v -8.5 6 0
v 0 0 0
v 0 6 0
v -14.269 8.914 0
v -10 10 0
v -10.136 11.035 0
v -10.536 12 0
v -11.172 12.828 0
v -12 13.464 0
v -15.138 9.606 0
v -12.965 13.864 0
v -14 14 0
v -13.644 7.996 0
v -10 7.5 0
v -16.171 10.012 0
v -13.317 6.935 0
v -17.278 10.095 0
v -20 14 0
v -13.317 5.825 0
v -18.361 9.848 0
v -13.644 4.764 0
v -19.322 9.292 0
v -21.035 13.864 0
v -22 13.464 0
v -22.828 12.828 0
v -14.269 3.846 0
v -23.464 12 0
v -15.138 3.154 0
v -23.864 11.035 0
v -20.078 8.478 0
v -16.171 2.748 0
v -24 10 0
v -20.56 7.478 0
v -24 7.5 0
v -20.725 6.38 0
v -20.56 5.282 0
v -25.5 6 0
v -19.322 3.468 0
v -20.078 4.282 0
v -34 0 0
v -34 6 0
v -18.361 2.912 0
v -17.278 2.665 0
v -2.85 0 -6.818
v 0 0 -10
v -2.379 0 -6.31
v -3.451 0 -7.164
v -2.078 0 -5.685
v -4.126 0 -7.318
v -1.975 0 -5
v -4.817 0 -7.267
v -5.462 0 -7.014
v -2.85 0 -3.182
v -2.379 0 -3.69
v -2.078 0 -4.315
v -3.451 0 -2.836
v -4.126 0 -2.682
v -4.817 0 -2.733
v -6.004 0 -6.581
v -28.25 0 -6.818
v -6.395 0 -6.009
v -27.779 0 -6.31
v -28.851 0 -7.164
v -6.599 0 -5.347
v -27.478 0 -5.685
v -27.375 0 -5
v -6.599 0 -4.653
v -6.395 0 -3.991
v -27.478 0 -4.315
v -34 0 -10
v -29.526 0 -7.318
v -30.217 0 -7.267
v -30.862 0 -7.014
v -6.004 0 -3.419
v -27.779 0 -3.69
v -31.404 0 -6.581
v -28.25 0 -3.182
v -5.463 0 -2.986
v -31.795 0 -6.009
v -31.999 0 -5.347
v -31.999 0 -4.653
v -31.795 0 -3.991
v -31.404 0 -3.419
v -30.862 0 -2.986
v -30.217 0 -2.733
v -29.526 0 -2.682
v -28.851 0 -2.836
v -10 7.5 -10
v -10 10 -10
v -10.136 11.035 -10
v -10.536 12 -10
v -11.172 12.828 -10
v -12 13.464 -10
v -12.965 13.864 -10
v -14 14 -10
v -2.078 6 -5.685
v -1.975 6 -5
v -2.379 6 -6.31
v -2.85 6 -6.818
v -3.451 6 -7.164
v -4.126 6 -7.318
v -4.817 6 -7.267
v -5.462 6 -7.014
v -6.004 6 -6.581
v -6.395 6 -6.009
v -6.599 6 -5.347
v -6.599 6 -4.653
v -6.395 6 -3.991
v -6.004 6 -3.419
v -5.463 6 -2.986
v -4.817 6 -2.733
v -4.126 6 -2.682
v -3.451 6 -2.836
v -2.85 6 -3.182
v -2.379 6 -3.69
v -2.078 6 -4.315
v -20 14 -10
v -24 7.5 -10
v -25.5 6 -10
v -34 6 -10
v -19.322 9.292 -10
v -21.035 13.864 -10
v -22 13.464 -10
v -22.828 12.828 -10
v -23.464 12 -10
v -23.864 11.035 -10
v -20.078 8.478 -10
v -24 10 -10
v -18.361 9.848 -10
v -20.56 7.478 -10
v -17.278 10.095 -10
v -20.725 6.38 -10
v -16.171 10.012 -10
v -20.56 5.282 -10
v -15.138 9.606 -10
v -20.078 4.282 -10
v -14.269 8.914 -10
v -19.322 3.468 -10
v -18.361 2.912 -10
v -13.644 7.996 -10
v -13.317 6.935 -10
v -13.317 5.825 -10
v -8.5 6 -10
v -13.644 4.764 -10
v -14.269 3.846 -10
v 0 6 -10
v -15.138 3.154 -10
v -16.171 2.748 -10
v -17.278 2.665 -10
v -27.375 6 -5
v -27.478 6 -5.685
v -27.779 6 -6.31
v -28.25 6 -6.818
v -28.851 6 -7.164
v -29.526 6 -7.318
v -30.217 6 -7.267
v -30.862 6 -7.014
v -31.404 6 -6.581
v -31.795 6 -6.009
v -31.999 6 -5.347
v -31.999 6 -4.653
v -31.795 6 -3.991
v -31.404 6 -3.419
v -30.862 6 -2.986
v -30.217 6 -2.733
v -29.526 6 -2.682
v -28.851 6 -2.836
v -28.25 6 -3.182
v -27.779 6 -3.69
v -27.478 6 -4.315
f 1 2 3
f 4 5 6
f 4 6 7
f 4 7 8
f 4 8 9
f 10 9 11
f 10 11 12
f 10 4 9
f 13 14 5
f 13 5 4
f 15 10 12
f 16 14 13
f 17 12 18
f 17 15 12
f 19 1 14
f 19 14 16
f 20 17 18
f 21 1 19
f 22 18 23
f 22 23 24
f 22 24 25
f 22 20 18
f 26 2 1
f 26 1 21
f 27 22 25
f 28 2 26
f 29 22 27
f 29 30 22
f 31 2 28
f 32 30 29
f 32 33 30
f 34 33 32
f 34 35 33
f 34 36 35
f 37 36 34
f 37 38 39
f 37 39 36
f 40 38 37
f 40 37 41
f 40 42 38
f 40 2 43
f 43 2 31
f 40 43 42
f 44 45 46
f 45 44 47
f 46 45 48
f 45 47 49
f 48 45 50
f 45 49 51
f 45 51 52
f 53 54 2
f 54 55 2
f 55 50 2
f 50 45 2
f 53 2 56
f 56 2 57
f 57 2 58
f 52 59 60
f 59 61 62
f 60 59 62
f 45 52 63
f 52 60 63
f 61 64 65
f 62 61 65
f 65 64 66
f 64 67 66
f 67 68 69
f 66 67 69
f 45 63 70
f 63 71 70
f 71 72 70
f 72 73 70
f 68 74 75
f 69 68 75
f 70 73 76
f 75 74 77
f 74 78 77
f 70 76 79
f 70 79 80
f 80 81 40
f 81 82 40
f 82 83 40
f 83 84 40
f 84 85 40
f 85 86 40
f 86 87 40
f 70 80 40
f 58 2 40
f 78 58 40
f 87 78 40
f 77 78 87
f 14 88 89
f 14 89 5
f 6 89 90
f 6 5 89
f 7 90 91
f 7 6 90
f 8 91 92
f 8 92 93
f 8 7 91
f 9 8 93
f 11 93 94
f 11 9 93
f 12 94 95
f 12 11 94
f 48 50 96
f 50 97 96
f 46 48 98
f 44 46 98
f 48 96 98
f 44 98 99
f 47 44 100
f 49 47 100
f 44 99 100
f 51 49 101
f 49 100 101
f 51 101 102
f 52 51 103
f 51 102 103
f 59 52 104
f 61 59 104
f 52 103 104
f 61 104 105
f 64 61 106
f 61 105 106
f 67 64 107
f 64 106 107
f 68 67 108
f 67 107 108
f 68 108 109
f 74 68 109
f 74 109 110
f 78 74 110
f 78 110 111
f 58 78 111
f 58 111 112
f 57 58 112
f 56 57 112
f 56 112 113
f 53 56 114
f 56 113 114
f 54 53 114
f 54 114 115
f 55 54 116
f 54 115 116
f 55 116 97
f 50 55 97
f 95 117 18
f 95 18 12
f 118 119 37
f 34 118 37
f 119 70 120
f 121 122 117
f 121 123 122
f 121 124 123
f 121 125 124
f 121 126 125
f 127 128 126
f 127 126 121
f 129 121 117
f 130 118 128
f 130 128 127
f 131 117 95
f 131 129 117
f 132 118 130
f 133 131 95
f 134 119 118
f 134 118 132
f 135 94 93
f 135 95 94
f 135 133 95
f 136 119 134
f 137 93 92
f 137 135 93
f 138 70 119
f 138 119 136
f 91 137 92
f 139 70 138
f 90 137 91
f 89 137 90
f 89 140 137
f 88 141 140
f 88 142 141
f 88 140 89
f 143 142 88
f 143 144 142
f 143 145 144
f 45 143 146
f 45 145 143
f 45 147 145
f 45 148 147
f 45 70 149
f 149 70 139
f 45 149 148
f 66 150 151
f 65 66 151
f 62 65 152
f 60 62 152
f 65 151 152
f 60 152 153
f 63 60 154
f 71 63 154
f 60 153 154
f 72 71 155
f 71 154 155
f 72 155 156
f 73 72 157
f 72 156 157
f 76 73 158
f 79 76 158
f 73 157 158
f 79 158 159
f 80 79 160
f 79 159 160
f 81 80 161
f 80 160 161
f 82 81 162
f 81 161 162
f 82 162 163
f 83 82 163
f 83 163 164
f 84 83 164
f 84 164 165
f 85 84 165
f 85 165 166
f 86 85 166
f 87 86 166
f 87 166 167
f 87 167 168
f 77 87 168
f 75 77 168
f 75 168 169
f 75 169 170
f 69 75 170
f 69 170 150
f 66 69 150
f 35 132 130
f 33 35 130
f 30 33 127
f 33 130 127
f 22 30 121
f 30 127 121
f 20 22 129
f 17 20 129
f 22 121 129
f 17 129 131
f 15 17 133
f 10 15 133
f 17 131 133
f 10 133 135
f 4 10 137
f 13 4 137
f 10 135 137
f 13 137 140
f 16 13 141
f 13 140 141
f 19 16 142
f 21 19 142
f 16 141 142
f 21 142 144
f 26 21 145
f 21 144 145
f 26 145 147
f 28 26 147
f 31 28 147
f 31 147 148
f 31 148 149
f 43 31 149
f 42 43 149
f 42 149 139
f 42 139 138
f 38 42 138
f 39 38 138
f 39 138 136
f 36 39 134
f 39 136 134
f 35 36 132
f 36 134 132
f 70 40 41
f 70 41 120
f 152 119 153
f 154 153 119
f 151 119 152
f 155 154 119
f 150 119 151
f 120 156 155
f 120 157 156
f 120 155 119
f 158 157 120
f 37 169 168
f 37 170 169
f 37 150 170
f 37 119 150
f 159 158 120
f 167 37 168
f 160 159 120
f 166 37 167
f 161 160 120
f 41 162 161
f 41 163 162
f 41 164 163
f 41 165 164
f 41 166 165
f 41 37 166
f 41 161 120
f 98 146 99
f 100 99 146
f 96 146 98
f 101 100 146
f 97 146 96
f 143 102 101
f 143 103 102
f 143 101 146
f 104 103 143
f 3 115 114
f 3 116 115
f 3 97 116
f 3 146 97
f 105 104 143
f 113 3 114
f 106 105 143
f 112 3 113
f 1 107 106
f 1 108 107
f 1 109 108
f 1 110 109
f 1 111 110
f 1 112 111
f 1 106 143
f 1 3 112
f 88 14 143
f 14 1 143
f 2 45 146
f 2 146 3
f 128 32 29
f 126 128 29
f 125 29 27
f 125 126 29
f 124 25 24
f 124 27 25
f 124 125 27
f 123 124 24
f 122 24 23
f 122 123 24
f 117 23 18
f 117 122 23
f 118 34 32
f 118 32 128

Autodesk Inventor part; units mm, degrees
ref_plane "YZ Plane" through (0, 0, 0) normal (1, 0, 0) x (0, 1, 0)
ref_plane "XZ Plane" through (0, 0, 0) normal (0, 1, 0) x (-1, 0, 0)
ref_plane "XY Plane" through (0, 0, 0) normal (0, 0, 1) x (1, 0, 0)
sketch "Sketch1" plane through (0, 0, 0) normal (0, 1, 0) x (-1, 0, 0)
  line L0 (0, 0) -> (34, 0)
  line L1 (34, 0) -> (34, -10)
  line L2 (34, -10) -> (0, -10)
  line L3 (0, -10) -> (0, 0)
  dimension "d0" = 34
  dimension "d1" = 10
extrude "Extrusion1" add sketch "Sketch1" along normal blind 6
sketch "Sketch3" plane through (0, 6, 0) normal (0, 1, 0) x (1, 0, 0)
  circle A0 centre (-4.3, 5) radius 2.325
  line L0 (0, 10) -> (-34, 10) projected
  circle A1 centre (-29.7, 5) radius 2.325
  line L1 (-34, 10) -> (-34, 0) projected
  line L2 (0, 0) -> (0, 10) projected
  dimension "d4" = 4.65
  dimension "d5" = 5
  dimension "d6" = 4.65
  dimension "d7" = 5
  dimension "d9" = 4.3
  dimension "d10" = 4.3
extrude "Extrusion2" cut sketch "Sketch3" against normal through all
sketch "Sketch4" plane through (0, 6, 0) normal (0, 1, 0) x (1, 0, 0)
  line L0 (-34, 0) -> (0, 0) projected
  line L1 (0, 10) -> (-34, 10) projected
  line L2 (-10, 0) -> (-24, 0)
  line L3 (-24, 0) -> (-24, 10)
  line L4 (-24, 10) -> (-10, 10)
  line L5 (-10, 10) -> (-10, 0)
  circle A0 centre (-4.3, 5) radius 2.325 projected
  line L6 (-34, 10) -> (-34, 0) projected
  line L7 (0, 0) -> (0, 10) projected
  point P0 (-10, 10)
  point P1 (-24, 0)
  dimension "d34" = 14
  dimension "d35" = 10
extrude "Extrusion3" add sketch "Sketch4" along normal blind 8 contours L3 L1 L5 L0
sketch "Sketch6" plane through (0, 0, -10) normal (0, 0, -1) x (-1, 0, 0)
  circle A0 centre (17, 6.38) radius 3.725
  line L0 (10, 14) -> (24, 14) projected
  line L1 (24, 6) -> (24, 14) projected
  point P0 (0, 0)
  dimension "d26" = 7.45
  dimension "d36" = 7.62
  dimension "d37" = 7
extrude "Extrusion4" cut sketch "Sketch6" against normal through all
fillet "Fillet2" radius 4 2 edges at (-24, 14, -5) (-10, 14, -5)
chamfer "Chamfer1" distance 1.5 angle 45 2 edges at (-10, 6, -5) (-24, 6, -5)
properties part number "Modular_Single_Axle_V41Y"
